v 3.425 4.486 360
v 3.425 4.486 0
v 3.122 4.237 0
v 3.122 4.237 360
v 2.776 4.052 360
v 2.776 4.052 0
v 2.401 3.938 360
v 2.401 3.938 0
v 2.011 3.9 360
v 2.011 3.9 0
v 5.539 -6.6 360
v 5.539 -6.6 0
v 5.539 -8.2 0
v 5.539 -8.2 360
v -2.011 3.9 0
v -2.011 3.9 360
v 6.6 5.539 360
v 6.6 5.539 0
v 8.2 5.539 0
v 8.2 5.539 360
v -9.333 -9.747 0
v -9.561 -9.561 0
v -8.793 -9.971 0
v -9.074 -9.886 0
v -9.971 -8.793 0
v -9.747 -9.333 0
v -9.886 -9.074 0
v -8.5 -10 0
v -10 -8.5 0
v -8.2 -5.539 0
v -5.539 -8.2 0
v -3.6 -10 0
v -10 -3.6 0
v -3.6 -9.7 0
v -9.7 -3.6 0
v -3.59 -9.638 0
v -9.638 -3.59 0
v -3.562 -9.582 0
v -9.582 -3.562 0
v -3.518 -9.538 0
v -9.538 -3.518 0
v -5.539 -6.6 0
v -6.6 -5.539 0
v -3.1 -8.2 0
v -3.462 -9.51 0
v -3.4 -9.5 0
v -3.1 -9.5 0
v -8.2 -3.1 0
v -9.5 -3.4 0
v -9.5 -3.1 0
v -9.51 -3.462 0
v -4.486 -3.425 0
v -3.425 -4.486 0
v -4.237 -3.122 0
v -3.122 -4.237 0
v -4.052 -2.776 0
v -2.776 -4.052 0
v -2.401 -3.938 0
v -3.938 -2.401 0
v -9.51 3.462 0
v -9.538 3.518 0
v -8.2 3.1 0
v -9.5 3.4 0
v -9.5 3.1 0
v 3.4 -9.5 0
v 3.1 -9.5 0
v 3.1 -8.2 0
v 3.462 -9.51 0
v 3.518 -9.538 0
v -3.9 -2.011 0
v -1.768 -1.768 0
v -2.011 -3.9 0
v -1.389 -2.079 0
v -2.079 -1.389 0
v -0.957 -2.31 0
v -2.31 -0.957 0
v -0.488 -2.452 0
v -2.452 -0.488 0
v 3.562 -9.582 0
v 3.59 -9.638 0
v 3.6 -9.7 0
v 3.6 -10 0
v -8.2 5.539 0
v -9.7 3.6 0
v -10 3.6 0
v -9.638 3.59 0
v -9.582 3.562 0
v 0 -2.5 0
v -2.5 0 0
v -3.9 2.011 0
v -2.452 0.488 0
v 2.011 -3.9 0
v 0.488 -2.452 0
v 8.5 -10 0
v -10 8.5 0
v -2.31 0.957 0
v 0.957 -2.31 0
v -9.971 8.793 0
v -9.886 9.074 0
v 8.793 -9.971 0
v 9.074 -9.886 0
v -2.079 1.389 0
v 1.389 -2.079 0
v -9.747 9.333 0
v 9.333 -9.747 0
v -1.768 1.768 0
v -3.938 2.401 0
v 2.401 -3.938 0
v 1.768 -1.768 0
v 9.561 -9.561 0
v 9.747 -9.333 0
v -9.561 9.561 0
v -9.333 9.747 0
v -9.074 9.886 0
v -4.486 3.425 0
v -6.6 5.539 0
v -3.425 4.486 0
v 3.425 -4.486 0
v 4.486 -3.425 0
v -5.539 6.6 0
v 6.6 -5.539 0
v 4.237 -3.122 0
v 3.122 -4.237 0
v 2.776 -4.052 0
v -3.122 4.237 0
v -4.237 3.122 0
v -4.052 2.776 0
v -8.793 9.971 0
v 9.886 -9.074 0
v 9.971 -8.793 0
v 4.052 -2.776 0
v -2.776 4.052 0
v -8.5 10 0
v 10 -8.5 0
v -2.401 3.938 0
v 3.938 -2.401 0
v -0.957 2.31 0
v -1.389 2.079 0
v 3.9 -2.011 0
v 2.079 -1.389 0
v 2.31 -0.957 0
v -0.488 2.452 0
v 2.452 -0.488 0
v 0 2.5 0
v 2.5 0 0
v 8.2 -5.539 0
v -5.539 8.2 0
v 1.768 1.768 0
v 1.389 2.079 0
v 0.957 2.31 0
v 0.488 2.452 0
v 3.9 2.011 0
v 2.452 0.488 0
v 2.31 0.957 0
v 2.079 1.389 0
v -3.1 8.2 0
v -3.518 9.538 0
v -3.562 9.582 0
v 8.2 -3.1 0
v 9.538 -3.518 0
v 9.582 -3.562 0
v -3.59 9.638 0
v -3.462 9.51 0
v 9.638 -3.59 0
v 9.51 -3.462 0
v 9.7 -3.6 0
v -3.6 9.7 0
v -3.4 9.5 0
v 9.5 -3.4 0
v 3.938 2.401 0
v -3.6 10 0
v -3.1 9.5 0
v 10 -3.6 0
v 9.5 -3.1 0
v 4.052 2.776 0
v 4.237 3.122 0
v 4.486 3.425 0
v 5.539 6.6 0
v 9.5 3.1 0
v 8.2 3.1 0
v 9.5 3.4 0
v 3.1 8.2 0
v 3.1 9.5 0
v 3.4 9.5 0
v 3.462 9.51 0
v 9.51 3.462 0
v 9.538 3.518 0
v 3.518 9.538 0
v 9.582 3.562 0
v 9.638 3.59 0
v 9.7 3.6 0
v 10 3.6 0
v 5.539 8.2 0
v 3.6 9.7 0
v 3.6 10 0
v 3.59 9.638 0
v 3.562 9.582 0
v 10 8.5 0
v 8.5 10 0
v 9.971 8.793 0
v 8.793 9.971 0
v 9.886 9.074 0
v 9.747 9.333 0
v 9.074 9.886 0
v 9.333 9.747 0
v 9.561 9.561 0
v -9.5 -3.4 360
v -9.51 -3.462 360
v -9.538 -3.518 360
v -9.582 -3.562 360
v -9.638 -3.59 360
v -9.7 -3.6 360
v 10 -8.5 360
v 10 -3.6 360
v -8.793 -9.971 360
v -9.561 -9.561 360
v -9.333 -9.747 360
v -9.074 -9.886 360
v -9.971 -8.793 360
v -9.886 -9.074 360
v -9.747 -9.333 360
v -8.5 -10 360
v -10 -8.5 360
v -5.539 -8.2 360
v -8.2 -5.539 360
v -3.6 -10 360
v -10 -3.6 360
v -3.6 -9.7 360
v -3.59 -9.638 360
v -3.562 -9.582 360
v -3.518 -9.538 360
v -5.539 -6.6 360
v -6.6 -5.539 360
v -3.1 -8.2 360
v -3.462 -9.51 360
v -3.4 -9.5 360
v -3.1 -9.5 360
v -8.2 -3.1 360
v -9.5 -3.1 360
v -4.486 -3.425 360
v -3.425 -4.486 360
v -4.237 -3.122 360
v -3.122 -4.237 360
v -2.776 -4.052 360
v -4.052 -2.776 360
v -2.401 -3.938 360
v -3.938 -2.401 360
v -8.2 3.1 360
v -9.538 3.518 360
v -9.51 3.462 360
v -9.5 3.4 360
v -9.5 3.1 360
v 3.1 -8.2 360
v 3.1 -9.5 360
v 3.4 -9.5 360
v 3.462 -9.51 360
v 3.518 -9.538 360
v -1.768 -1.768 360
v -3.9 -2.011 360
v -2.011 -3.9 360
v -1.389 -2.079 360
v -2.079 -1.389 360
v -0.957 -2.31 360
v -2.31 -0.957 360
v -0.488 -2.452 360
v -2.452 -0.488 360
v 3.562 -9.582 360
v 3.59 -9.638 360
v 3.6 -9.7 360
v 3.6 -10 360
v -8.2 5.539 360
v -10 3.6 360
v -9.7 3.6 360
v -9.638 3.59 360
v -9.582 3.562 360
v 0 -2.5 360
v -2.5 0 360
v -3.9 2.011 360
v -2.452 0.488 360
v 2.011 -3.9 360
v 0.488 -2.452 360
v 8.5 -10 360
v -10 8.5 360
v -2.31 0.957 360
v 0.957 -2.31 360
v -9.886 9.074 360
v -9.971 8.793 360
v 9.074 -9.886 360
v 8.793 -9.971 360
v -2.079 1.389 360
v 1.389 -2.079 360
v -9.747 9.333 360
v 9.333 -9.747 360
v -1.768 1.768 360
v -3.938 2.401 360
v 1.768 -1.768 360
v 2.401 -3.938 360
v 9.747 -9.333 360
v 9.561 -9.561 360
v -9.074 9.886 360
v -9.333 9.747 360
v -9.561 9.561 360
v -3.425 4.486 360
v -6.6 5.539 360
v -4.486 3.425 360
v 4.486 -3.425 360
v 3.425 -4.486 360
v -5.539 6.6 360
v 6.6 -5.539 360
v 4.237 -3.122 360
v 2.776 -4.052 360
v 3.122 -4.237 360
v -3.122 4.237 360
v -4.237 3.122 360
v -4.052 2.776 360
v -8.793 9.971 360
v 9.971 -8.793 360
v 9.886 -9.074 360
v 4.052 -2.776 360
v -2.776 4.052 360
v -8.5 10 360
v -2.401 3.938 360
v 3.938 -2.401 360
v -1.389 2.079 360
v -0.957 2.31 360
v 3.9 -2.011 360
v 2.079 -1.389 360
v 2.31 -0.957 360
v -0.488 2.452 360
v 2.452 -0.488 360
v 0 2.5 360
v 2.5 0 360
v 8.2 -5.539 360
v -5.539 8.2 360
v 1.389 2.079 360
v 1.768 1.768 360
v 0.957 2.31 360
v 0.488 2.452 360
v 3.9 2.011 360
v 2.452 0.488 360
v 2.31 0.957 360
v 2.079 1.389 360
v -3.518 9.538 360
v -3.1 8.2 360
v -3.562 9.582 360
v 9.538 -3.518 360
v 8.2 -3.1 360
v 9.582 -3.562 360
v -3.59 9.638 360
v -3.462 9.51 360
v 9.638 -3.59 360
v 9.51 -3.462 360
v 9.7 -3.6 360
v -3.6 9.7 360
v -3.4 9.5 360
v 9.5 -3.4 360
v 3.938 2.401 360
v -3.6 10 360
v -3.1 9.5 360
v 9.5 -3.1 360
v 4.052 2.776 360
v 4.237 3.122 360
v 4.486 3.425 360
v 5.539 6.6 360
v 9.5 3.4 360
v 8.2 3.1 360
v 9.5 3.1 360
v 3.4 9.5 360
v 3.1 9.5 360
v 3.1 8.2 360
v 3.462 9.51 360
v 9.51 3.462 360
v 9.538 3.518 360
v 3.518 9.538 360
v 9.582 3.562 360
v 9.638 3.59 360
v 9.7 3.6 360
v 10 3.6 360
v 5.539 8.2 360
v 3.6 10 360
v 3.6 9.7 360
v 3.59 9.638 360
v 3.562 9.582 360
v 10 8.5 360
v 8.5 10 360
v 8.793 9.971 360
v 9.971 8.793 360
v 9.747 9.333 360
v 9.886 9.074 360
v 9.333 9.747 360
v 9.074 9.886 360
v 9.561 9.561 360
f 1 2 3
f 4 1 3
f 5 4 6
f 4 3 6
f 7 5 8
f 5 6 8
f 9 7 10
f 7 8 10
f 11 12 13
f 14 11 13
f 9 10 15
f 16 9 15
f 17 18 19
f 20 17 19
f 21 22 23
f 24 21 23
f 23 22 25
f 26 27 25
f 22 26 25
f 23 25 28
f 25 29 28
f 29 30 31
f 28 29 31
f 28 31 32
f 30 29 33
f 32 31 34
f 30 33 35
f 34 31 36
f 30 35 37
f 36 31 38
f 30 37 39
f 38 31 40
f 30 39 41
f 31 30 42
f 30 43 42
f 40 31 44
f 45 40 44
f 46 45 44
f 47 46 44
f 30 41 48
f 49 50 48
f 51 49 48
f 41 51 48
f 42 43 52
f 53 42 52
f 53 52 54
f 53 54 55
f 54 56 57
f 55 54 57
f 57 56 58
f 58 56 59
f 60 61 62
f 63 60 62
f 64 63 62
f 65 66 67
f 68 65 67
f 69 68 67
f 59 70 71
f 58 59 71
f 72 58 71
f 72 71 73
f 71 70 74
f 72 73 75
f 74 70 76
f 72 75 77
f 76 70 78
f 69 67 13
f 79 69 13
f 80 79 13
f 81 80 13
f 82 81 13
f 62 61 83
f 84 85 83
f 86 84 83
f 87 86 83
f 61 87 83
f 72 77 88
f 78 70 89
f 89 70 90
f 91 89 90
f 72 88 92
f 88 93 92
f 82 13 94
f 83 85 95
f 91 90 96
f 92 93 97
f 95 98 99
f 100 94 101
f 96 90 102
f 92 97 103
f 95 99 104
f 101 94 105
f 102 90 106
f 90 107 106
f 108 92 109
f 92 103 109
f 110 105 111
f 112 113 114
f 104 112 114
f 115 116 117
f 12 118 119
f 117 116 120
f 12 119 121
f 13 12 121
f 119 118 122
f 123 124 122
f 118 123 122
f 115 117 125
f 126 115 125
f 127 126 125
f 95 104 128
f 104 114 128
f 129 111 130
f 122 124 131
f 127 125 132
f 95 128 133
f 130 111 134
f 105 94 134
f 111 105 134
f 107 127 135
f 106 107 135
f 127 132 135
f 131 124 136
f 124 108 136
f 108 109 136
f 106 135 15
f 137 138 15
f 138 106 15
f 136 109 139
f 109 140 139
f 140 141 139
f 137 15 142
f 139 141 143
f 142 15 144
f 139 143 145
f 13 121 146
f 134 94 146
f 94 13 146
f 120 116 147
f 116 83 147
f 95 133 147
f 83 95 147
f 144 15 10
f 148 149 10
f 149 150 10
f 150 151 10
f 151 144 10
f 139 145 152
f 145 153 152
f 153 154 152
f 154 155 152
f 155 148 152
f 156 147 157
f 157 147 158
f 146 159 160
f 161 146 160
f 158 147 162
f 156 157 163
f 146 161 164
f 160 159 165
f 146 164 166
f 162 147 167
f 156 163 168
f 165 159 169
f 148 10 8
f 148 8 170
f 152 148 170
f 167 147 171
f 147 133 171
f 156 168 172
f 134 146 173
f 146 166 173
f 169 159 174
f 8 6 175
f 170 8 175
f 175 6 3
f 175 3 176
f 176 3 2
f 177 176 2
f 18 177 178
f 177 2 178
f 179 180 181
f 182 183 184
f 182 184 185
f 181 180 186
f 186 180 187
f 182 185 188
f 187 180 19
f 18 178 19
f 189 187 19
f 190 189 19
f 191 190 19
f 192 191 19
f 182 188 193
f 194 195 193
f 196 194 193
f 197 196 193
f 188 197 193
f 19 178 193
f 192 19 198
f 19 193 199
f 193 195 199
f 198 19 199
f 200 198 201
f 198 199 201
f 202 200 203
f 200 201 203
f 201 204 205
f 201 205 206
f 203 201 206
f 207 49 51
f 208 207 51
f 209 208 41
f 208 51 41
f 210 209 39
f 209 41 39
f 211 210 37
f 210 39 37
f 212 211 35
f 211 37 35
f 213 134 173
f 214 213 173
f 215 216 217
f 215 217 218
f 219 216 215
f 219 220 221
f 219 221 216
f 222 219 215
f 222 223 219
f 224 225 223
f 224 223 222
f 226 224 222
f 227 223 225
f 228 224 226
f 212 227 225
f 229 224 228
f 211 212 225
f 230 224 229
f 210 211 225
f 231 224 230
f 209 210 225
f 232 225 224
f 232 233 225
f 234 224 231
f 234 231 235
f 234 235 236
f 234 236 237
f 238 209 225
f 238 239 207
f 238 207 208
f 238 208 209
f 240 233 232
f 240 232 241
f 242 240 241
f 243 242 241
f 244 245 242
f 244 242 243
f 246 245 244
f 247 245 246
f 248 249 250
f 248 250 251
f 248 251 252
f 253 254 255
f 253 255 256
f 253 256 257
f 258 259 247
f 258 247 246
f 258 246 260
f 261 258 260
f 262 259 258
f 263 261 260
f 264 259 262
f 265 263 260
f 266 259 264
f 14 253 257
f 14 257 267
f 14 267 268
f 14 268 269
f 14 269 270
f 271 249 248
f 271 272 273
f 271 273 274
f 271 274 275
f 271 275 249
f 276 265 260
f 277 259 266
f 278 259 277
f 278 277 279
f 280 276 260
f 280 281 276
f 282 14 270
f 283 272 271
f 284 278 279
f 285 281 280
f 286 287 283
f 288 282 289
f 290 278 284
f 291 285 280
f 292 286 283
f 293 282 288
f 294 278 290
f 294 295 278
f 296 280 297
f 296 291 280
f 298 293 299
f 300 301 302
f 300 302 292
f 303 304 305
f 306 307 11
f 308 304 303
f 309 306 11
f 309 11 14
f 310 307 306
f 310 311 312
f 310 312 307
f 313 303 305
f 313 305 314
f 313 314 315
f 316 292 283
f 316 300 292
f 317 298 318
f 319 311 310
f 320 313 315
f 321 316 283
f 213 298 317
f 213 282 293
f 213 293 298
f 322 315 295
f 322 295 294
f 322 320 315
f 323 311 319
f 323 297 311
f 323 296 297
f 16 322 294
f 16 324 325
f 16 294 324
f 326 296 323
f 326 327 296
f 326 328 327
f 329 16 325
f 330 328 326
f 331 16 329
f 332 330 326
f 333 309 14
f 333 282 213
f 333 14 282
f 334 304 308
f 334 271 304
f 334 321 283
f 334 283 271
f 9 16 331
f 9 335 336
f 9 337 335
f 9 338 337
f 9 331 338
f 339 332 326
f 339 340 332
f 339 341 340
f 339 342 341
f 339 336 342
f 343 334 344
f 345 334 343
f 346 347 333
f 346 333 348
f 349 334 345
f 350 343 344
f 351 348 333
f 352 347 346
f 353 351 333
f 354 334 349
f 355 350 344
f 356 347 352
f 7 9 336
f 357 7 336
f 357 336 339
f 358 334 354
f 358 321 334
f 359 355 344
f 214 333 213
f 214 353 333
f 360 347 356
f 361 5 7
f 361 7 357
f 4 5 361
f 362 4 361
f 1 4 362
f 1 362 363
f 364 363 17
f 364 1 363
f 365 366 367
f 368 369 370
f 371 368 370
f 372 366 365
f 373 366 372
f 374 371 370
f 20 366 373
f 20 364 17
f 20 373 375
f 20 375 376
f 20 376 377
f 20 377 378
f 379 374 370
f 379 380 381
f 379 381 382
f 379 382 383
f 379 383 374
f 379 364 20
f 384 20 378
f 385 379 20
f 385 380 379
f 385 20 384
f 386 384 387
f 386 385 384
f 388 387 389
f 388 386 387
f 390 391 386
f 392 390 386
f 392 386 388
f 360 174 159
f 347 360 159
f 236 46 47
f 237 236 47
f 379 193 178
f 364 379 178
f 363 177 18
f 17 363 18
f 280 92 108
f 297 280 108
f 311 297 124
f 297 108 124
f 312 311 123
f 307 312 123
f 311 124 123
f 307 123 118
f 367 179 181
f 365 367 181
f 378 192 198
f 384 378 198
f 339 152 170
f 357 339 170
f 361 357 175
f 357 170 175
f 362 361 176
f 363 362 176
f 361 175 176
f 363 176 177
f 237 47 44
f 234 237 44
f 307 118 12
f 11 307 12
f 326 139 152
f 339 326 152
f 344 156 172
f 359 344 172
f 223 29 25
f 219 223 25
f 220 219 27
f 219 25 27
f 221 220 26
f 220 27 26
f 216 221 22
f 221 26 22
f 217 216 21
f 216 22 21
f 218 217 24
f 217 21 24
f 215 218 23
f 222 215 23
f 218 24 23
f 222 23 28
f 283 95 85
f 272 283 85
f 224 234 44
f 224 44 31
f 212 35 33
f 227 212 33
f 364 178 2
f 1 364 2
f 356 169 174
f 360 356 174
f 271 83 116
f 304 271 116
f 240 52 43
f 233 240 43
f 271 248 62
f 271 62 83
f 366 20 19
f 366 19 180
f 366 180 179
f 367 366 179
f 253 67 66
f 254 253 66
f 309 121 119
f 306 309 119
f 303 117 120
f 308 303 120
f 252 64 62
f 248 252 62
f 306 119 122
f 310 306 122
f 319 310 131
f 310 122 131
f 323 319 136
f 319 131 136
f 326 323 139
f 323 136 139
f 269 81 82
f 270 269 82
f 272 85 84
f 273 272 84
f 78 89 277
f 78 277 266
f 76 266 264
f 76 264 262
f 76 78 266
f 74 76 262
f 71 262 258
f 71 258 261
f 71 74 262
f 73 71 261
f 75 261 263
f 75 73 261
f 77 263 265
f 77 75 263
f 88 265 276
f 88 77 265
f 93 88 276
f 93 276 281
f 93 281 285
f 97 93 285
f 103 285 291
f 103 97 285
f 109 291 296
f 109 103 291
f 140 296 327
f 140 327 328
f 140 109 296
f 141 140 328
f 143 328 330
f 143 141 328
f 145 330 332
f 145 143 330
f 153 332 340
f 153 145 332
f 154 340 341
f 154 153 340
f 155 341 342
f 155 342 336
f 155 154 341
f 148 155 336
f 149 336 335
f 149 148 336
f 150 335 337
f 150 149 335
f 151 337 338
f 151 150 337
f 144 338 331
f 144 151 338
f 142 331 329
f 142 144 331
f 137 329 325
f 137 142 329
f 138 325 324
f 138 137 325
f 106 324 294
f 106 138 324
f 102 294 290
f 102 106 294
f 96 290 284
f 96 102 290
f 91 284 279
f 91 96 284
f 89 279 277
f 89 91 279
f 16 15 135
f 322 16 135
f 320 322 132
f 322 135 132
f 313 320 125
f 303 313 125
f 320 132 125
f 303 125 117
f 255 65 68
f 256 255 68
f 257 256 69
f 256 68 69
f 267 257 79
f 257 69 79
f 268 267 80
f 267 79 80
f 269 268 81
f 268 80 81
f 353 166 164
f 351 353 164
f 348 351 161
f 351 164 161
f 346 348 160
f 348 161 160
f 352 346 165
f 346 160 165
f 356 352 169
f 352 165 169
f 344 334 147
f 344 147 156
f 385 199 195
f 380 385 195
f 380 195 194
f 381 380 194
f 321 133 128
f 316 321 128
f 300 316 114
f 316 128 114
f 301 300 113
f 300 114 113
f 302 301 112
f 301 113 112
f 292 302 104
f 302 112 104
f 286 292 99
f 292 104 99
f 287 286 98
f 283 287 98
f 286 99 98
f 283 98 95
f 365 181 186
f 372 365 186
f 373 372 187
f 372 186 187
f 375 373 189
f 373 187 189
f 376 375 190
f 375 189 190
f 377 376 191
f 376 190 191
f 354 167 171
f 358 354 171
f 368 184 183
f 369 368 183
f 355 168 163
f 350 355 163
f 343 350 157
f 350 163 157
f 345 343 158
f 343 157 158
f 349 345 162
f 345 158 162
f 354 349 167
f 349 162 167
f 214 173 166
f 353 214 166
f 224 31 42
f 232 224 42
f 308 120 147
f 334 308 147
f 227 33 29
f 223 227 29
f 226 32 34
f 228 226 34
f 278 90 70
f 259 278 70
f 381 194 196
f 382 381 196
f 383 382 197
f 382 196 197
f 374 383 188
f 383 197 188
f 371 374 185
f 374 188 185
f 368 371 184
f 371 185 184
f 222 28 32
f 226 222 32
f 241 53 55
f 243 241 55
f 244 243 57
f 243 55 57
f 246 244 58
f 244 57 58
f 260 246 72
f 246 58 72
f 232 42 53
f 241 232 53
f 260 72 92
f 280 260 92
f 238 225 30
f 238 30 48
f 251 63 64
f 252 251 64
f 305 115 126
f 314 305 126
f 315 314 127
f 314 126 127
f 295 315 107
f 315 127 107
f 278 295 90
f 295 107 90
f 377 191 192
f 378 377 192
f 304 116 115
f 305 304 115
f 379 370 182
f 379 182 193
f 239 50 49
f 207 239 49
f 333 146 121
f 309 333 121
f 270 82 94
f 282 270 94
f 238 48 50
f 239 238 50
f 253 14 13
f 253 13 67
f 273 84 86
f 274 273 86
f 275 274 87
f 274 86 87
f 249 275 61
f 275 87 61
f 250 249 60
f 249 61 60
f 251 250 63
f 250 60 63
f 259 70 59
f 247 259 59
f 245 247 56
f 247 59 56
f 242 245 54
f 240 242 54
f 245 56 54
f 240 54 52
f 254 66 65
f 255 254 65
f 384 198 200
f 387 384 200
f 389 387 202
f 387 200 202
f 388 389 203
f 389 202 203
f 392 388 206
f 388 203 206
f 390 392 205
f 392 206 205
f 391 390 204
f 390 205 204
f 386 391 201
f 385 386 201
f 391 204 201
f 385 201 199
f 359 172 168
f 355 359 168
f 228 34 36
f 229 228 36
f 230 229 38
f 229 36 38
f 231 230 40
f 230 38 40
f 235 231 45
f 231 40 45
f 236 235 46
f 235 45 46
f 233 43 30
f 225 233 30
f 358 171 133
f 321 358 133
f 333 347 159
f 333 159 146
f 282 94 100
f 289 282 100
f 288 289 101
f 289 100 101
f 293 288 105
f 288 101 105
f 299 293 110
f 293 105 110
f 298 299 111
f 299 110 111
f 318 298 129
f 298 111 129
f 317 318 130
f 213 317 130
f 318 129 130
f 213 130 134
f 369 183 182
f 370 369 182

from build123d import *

# Parameters (mm, degrees)
SKETCH1_R      = 2.5
EXTRUDE1_DEPTH = 360


with BuildPart() as part:
    # Sketch1 → Extrude1 (new body)
    with BuildSketch(Plane.XY):
        with BuildLine():
            Line((0, 3.9), (-2.010912703, 3.9))
            ThreePointArc((-2.010912703, 3.9), (-2.776279568, 4.052240935), (-3.425126266, 4.485786438))
            Line((-3.425126266, 4.485786438), (-5.539339828, 6.6))
            Line((-5.539339828, 6.6), (-5.539339828, 8.2))
            Line((-5.539339828, 8.2), (-3.1, 8.2))
            Line((-3.1, 8.2), (-3.1, 9.5))
            Line((-3.1, 9.5), (-3.4, 9.5))
            ThreePointArc((-3.4, 9.5), (-3.541421356, 9.558578644), (-3.6, 9.7))
            Line((-3.6, 9.7), (-3.6, 10))
            Line((-3.6, 10), (-8.5, 10))
            ThreePointArc((-8.5, 10), (-9.560660172, 9.560660172), (-10, 8.5))
            Line((-10, 8.5), (-10, 3.6))
            Line((-10, 3.6), (-9.7, 3.6))
            ThreePointArc((-9.7, 3.6), (-9.558578644, 3.541421356), (-9.5, 3.4))
            Line((-9.5, 3.4), (-9.5, 3.1))
            Line((-9.5, 3.1), (-8.2, 3.1))
            Line((-8.2, 3.1), (-8.2, 5.539339828))
            Line((-8.2, 5.539339828), (-6.6, 5.539339828))
            Line((-6.6, 5.539339828), (-4.485786438, 3.425126266))
            ThreePointArc((-4.485786438, 3.425126266), (-4.052240935, 2.776279568), (-3.9, 2.010912703))
            Line((-3.9, 2.010912703), (-3.9, 0))
            Line((-3.9, 0), (-3.9, -2.010912703))
            ThreePointArc((-3.9, -2.010912703), (-4.052240935, -2.776279568), (-4.485786438, -3.425126266))
            Line((-4.485786438, -3.425126266), (-6.6, -5.539339828))
            Line((-6.6, -5.539339828), (-8.2, -5.539339828))
            Line((-8.2, -5.539339828), (-8.2, -3.1))
            Line((-8.2, -3.1), (-9.5, -3.1))
            Line((-9.5, -3.1), (-9.5, -3.4))
            ThreePointArc((-9.5, -3.4), (-9.558578644, -3.541421356), (-9.7, -3.6))
            Line((-9.7, -3.6), (-10, -3.6))
            Line((-10, -3.6), (-10, -8.5))
            ThreePointArc((-10, -8.5), (-9.560660172, -9.560660172), (-8.5, -10))
            Line((-8.5, -10), (-3.6, -10))
            Line((-3.6, -10), (-3.6, -9.7))
            ThreePointArc((-3.6, -9.7), (-3.541421356, -9.558578644), (-3.4, -9.5))
            Line((-3.4, -9.5), (-3.1, -9.5))
            Line((-3.1, -9.5), (-3.1, -8.2))
            Line((-3.1, -8.2), (-5.539339828, -8.2))
            Line((-5.539339828, -8.2), (-5.539339828, -6.6))
            Line((-5.539339828, -6.6), (-3.425126266, -4.485786438))
            ThreePointArc((-3.425126266, -4.485786438), (-2.776279568, -4.052240935), (-2.010912703, -3.9))
            Line((-2.010912703, -3.9), (0, -3.9))
            Line((0, -3.9), (2.010912703, -3.9))
            ThreePointArc((2.010912703, -3.9), (2.776279568, -4.052240935), (3.425126266, -4.485786438))
            Line((3.425126266, -4.485786438), (5.539339828, -6.6))
            Line((5.539339828, -6.6), (5.539339828, -8.2))
            Line((5.539339828, -8.2), (3.1, -8.2))
            Line((3.1, -8.2), (3.1, -9.5))
            Line((3.1, -9.5), (3.4, -9.5))
            ThreePointArc((3.4, -9.5), (3.541421356, -9.558578644), (3.6, -9.7))
            Line((3.6, -9.7), (3.6, -10))
            Line((3.6, -10), (8.5, -10))
            ThreePointArc((8.5, -10), (9.560660172, -9.560660172), (10, -8.5))
            Line((10, -8.5), (10, -3.6))
            Line((10, -3.6), (9.7, -3.6))
            ThreePointArc((9.7, -3.6), (9.558578644, -3.541421356), (9.5, -3.4))
            Line((9.5, -3.4), (9.5, -3.1))
            Line((9.5, -3.1), (8.2, -3.1))
            Line((8.2, -3.1), (8.2, -5.539339828))
            Line((8.2, -5.539339828), (6.6, -5.539339828))
            Line((6.6, -5.539339828), (4.485786438, -3.425126266))
            ThreePointArc((4.485786438, -3.425126266), (4.052240935, -2.776279568), (3.9, -2.010912703))
            Line((3.9, -2.010912703), (3.9, 0))
            Line((3.9, 0), (3.9, 2.010912703))
            ThreePointArc((3.9, 2.010912703), (4.052240935, 2.776279568), (4.485786438, 3.425126266))
            Line((4.485786438, 3.425126266), (6.6, 5.539339828))
            Line((6.6, 5.539339828), (8.2, 5.539339828))
            Line((8.2, 5.539339828), (8.2, 3.1))
            Line((8.2, 3.1), (9.5, 3.1))
            Line((9.5, 3.1), (9.5, 3.4))
            ThreePointArc((9.5, 3.4), (9.558578644, 3.541421356), (9.7, 3.6))
            Line((9.7, 3.6), (10, 3.6))
            Line((10, 3.6), (10, 8.5))
            ThreePointArc((10, 8.5), (9.560660172, 9.560660172), (8.5, 10))
            Line((8.5, 10), (3.6, 10))
            Line((3.6, 10), (3.6, 9.7))
            ThreePointArc((3.6, 9.7), (3.541421356, 9.558578644), (3.4, 9.5))
            Line((3.4, 9.5), (3.1, 9.5))
            Line((3.1, 9.5), (3.1, 8.2))
            Line((3.1, 8.2), (5.539339828, 8.2))
            Line((5.539339828, 8.2), (5.539339828, 6.6))
            Line((5.539339828, 6.6), (3.425126266, 4.485786438))
            ThreePointArc((3.425126266, 4.485786438), (2.776279568, 4.052240935), (2.010912703, 3.9))
            Line((2.010912703, 3.9), (0, 3.9))
        make_face()
        with Locations(Location((0, 0, 0), (0, 0, 180))):
            Circle(SKETCH1_R, mode=Mode.SUBTRACT)
    extrude(amount=EXTRUDE1_DEPTH)


solid = part.part
